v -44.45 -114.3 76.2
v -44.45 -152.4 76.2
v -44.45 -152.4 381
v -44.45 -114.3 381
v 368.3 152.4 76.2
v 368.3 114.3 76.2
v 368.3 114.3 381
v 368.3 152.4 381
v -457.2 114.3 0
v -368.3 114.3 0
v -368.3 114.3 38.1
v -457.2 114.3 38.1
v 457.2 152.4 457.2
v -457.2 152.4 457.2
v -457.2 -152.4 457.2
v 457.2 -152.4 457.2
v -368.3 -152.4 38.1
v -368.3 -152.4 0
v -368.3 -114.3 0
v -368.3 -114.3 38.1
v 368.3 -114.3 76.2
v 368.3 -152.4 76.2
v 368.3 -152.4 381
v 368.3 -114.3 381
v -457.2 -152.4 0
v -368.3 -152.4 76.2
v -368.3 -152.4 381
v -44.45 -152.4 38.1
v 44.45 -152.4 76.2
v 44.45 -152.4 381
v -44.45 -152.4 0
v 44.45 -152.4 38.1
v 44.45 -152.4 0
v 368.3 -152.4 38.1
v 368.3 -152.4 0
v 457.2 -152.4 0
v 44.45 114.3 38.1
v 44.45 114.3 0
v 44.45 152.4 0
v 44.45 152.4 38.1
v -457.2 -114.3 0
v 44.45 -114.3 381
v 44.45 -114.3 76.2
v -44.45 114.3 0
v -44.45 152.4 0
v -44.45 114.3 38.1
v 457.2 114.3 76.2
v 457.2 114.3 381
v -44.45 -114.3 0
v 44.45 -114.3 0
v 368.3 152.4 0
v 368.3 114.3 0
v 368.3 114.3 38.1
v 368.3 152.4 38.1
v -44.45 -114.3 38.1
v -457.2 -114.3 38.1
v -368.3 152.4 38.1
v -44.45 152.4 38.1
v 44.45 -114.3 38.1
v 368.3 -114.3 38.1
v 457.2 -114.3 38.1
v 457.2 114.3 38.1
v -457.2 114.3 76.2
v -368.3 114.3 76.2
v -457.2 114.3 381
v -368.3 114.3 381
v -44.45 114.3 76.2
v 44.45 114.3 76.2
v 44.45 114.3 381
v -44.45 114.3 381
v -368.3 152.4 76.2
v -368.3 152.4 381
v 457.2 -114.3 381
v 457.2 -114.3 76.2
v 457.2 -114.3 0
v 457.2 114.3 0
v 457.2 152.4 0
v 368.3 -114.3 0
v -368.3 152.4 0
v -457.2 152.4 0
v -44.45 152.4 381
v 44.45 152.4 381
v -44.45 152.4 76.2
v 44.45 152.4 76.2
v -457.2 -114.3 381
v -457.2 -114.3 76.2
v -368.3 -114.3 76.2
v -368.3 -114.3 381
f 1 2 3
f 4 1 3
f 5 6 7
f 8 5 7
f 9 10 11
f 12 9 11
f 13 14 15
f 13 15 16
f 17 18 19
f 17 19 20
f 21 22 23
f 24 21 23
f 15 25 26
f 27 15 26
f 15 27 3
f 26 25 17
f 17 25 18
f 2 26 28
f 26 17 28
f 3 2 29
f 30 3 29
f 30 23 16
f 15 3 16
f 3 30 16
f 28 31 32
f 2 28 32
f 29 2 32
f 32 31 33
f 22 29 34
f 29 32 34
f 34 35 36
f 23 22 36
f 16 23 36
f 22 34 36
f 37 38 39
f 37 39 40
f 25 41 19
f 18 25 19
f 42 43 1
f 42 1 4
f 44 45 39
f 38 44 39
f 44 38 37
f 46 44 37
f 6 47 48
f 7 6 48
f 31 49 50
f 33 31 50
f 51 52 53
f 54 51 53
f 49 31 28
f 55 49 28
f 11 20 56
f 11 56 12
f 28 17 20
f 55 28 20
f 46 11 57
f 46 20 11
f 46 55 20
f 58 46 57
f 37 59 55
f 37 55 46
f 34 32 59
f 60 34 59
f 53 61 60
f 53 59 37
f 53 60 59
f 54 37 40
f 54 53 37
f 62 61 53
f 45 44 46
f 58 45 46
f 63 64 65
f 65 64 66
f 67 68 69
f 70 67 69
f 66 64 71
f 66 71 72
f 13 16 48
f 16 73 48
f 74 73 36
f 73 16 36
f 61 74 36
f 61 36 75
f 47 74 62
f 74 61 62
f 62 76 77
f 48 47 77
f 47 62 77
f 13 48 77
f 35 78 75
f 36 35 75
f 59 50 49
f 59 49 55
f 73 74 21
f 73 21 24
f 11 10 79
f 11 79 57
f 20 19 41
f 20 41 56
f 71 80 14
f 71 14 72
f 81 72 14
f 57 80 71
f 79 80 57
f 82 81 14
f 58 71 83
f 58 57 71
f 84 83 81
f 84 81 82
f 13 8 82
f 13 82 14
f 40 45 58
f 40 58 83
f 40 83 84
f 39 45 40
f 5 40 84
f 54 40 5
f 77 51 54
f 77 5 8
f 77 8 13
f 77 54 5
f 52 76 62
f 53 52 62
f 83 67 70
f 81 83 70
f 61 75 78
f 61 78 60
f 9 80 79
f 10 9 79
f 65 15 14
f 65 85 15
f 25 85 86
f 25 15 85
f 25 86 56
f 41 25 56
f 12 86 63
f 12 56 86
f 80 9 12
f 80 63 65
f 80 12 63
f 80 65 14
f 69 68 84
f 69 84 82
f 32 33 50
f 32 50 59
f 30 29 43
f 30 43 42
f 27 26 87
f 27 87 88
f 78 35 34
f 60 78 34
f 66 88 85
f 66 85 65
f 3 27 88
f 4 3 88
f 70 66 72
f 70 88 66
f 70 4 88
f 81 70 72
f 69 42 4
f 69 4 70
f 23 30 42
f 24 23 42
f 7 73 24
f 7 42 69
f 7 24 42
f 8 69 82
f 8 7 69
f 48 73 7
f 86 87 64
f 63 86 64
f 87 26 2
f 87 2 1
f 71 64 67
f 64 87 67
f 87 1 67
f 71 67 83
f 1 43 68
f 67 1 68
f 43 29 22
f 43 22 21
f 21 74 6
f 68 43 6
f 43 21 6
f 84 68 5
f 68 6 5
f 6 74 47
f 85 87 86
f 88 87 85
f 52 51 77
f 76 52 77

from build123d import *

# Parameters (mm, degrees)
F0_W     = 914.4
F0_H     = 304.8
F1_DEPTH = 457.2
F2_W     = 323.85
F2_H     = 304.8
F3_DEPTH = 304.801
F4_W     = 228.6
F4_H     = 304.8
F5_DEPTH = 914.401
F6_W     = 323.85
F6_H     = 38.1
F7_DEPTH = 304.801
F8_W     = 228.6
F8_H     = 38.1
F9_DEPTH = 914.401


with BuildPart() as f1:
    # F0 (on Top) → F1 (new body)
    with BuildSketch(Plane.XY):
        Rectangle(F0_W, F0_H)
    extrude(amount=F1_DEPTH)

    # F2 (on face) → F3 (cut, through all)
    with BuildSketch(Plane.XZ.offset(152.4)):
        with Locations((-206.375, 228.6)):
            Rectangle(F2_W, F2_H)
        with Locations((206.375, 228.6)):
            Rectangle(F2_W, F2_H)
    extrude(amount=-F3_DEPTH, mode=Mode.SUBTRACT)

    # F4 (on face) → F5 (cut, through all)
    with BuildSketch(Plane.YZ.offset(457.2)):
        with Locations((0, 228.6)):
            Rectangle(F4_W, F4_H)
    extrude(amount=-F5_DEPTH, mode=Mode.SUBTRACT)

    # F6 (on face) → F7 (cut, through all)
    with BuildSketch(Plane.XZ.offset(152.4)):
        with Locations((-206.375, 19.05)):
            Rectangle(F6_W, F6_H)
        with Locations((206.375, 19.05)):
            Rectangle(F6_W, F6_H)
    extrude(amount=-F7_DEPTH, mode=Mode.SUBTRACT)

    # F8 (on face) → F9 (cut, through all)
    with BuildSketch(Plane.YZ.offset(457.2)):
        with Locations((0, 19.05)):
            Rectangle(F8_W, F8_H)
    extrude(amount=-F9_DEPTH, mode=Mode.SUBTRACT)


solid = f1.part
